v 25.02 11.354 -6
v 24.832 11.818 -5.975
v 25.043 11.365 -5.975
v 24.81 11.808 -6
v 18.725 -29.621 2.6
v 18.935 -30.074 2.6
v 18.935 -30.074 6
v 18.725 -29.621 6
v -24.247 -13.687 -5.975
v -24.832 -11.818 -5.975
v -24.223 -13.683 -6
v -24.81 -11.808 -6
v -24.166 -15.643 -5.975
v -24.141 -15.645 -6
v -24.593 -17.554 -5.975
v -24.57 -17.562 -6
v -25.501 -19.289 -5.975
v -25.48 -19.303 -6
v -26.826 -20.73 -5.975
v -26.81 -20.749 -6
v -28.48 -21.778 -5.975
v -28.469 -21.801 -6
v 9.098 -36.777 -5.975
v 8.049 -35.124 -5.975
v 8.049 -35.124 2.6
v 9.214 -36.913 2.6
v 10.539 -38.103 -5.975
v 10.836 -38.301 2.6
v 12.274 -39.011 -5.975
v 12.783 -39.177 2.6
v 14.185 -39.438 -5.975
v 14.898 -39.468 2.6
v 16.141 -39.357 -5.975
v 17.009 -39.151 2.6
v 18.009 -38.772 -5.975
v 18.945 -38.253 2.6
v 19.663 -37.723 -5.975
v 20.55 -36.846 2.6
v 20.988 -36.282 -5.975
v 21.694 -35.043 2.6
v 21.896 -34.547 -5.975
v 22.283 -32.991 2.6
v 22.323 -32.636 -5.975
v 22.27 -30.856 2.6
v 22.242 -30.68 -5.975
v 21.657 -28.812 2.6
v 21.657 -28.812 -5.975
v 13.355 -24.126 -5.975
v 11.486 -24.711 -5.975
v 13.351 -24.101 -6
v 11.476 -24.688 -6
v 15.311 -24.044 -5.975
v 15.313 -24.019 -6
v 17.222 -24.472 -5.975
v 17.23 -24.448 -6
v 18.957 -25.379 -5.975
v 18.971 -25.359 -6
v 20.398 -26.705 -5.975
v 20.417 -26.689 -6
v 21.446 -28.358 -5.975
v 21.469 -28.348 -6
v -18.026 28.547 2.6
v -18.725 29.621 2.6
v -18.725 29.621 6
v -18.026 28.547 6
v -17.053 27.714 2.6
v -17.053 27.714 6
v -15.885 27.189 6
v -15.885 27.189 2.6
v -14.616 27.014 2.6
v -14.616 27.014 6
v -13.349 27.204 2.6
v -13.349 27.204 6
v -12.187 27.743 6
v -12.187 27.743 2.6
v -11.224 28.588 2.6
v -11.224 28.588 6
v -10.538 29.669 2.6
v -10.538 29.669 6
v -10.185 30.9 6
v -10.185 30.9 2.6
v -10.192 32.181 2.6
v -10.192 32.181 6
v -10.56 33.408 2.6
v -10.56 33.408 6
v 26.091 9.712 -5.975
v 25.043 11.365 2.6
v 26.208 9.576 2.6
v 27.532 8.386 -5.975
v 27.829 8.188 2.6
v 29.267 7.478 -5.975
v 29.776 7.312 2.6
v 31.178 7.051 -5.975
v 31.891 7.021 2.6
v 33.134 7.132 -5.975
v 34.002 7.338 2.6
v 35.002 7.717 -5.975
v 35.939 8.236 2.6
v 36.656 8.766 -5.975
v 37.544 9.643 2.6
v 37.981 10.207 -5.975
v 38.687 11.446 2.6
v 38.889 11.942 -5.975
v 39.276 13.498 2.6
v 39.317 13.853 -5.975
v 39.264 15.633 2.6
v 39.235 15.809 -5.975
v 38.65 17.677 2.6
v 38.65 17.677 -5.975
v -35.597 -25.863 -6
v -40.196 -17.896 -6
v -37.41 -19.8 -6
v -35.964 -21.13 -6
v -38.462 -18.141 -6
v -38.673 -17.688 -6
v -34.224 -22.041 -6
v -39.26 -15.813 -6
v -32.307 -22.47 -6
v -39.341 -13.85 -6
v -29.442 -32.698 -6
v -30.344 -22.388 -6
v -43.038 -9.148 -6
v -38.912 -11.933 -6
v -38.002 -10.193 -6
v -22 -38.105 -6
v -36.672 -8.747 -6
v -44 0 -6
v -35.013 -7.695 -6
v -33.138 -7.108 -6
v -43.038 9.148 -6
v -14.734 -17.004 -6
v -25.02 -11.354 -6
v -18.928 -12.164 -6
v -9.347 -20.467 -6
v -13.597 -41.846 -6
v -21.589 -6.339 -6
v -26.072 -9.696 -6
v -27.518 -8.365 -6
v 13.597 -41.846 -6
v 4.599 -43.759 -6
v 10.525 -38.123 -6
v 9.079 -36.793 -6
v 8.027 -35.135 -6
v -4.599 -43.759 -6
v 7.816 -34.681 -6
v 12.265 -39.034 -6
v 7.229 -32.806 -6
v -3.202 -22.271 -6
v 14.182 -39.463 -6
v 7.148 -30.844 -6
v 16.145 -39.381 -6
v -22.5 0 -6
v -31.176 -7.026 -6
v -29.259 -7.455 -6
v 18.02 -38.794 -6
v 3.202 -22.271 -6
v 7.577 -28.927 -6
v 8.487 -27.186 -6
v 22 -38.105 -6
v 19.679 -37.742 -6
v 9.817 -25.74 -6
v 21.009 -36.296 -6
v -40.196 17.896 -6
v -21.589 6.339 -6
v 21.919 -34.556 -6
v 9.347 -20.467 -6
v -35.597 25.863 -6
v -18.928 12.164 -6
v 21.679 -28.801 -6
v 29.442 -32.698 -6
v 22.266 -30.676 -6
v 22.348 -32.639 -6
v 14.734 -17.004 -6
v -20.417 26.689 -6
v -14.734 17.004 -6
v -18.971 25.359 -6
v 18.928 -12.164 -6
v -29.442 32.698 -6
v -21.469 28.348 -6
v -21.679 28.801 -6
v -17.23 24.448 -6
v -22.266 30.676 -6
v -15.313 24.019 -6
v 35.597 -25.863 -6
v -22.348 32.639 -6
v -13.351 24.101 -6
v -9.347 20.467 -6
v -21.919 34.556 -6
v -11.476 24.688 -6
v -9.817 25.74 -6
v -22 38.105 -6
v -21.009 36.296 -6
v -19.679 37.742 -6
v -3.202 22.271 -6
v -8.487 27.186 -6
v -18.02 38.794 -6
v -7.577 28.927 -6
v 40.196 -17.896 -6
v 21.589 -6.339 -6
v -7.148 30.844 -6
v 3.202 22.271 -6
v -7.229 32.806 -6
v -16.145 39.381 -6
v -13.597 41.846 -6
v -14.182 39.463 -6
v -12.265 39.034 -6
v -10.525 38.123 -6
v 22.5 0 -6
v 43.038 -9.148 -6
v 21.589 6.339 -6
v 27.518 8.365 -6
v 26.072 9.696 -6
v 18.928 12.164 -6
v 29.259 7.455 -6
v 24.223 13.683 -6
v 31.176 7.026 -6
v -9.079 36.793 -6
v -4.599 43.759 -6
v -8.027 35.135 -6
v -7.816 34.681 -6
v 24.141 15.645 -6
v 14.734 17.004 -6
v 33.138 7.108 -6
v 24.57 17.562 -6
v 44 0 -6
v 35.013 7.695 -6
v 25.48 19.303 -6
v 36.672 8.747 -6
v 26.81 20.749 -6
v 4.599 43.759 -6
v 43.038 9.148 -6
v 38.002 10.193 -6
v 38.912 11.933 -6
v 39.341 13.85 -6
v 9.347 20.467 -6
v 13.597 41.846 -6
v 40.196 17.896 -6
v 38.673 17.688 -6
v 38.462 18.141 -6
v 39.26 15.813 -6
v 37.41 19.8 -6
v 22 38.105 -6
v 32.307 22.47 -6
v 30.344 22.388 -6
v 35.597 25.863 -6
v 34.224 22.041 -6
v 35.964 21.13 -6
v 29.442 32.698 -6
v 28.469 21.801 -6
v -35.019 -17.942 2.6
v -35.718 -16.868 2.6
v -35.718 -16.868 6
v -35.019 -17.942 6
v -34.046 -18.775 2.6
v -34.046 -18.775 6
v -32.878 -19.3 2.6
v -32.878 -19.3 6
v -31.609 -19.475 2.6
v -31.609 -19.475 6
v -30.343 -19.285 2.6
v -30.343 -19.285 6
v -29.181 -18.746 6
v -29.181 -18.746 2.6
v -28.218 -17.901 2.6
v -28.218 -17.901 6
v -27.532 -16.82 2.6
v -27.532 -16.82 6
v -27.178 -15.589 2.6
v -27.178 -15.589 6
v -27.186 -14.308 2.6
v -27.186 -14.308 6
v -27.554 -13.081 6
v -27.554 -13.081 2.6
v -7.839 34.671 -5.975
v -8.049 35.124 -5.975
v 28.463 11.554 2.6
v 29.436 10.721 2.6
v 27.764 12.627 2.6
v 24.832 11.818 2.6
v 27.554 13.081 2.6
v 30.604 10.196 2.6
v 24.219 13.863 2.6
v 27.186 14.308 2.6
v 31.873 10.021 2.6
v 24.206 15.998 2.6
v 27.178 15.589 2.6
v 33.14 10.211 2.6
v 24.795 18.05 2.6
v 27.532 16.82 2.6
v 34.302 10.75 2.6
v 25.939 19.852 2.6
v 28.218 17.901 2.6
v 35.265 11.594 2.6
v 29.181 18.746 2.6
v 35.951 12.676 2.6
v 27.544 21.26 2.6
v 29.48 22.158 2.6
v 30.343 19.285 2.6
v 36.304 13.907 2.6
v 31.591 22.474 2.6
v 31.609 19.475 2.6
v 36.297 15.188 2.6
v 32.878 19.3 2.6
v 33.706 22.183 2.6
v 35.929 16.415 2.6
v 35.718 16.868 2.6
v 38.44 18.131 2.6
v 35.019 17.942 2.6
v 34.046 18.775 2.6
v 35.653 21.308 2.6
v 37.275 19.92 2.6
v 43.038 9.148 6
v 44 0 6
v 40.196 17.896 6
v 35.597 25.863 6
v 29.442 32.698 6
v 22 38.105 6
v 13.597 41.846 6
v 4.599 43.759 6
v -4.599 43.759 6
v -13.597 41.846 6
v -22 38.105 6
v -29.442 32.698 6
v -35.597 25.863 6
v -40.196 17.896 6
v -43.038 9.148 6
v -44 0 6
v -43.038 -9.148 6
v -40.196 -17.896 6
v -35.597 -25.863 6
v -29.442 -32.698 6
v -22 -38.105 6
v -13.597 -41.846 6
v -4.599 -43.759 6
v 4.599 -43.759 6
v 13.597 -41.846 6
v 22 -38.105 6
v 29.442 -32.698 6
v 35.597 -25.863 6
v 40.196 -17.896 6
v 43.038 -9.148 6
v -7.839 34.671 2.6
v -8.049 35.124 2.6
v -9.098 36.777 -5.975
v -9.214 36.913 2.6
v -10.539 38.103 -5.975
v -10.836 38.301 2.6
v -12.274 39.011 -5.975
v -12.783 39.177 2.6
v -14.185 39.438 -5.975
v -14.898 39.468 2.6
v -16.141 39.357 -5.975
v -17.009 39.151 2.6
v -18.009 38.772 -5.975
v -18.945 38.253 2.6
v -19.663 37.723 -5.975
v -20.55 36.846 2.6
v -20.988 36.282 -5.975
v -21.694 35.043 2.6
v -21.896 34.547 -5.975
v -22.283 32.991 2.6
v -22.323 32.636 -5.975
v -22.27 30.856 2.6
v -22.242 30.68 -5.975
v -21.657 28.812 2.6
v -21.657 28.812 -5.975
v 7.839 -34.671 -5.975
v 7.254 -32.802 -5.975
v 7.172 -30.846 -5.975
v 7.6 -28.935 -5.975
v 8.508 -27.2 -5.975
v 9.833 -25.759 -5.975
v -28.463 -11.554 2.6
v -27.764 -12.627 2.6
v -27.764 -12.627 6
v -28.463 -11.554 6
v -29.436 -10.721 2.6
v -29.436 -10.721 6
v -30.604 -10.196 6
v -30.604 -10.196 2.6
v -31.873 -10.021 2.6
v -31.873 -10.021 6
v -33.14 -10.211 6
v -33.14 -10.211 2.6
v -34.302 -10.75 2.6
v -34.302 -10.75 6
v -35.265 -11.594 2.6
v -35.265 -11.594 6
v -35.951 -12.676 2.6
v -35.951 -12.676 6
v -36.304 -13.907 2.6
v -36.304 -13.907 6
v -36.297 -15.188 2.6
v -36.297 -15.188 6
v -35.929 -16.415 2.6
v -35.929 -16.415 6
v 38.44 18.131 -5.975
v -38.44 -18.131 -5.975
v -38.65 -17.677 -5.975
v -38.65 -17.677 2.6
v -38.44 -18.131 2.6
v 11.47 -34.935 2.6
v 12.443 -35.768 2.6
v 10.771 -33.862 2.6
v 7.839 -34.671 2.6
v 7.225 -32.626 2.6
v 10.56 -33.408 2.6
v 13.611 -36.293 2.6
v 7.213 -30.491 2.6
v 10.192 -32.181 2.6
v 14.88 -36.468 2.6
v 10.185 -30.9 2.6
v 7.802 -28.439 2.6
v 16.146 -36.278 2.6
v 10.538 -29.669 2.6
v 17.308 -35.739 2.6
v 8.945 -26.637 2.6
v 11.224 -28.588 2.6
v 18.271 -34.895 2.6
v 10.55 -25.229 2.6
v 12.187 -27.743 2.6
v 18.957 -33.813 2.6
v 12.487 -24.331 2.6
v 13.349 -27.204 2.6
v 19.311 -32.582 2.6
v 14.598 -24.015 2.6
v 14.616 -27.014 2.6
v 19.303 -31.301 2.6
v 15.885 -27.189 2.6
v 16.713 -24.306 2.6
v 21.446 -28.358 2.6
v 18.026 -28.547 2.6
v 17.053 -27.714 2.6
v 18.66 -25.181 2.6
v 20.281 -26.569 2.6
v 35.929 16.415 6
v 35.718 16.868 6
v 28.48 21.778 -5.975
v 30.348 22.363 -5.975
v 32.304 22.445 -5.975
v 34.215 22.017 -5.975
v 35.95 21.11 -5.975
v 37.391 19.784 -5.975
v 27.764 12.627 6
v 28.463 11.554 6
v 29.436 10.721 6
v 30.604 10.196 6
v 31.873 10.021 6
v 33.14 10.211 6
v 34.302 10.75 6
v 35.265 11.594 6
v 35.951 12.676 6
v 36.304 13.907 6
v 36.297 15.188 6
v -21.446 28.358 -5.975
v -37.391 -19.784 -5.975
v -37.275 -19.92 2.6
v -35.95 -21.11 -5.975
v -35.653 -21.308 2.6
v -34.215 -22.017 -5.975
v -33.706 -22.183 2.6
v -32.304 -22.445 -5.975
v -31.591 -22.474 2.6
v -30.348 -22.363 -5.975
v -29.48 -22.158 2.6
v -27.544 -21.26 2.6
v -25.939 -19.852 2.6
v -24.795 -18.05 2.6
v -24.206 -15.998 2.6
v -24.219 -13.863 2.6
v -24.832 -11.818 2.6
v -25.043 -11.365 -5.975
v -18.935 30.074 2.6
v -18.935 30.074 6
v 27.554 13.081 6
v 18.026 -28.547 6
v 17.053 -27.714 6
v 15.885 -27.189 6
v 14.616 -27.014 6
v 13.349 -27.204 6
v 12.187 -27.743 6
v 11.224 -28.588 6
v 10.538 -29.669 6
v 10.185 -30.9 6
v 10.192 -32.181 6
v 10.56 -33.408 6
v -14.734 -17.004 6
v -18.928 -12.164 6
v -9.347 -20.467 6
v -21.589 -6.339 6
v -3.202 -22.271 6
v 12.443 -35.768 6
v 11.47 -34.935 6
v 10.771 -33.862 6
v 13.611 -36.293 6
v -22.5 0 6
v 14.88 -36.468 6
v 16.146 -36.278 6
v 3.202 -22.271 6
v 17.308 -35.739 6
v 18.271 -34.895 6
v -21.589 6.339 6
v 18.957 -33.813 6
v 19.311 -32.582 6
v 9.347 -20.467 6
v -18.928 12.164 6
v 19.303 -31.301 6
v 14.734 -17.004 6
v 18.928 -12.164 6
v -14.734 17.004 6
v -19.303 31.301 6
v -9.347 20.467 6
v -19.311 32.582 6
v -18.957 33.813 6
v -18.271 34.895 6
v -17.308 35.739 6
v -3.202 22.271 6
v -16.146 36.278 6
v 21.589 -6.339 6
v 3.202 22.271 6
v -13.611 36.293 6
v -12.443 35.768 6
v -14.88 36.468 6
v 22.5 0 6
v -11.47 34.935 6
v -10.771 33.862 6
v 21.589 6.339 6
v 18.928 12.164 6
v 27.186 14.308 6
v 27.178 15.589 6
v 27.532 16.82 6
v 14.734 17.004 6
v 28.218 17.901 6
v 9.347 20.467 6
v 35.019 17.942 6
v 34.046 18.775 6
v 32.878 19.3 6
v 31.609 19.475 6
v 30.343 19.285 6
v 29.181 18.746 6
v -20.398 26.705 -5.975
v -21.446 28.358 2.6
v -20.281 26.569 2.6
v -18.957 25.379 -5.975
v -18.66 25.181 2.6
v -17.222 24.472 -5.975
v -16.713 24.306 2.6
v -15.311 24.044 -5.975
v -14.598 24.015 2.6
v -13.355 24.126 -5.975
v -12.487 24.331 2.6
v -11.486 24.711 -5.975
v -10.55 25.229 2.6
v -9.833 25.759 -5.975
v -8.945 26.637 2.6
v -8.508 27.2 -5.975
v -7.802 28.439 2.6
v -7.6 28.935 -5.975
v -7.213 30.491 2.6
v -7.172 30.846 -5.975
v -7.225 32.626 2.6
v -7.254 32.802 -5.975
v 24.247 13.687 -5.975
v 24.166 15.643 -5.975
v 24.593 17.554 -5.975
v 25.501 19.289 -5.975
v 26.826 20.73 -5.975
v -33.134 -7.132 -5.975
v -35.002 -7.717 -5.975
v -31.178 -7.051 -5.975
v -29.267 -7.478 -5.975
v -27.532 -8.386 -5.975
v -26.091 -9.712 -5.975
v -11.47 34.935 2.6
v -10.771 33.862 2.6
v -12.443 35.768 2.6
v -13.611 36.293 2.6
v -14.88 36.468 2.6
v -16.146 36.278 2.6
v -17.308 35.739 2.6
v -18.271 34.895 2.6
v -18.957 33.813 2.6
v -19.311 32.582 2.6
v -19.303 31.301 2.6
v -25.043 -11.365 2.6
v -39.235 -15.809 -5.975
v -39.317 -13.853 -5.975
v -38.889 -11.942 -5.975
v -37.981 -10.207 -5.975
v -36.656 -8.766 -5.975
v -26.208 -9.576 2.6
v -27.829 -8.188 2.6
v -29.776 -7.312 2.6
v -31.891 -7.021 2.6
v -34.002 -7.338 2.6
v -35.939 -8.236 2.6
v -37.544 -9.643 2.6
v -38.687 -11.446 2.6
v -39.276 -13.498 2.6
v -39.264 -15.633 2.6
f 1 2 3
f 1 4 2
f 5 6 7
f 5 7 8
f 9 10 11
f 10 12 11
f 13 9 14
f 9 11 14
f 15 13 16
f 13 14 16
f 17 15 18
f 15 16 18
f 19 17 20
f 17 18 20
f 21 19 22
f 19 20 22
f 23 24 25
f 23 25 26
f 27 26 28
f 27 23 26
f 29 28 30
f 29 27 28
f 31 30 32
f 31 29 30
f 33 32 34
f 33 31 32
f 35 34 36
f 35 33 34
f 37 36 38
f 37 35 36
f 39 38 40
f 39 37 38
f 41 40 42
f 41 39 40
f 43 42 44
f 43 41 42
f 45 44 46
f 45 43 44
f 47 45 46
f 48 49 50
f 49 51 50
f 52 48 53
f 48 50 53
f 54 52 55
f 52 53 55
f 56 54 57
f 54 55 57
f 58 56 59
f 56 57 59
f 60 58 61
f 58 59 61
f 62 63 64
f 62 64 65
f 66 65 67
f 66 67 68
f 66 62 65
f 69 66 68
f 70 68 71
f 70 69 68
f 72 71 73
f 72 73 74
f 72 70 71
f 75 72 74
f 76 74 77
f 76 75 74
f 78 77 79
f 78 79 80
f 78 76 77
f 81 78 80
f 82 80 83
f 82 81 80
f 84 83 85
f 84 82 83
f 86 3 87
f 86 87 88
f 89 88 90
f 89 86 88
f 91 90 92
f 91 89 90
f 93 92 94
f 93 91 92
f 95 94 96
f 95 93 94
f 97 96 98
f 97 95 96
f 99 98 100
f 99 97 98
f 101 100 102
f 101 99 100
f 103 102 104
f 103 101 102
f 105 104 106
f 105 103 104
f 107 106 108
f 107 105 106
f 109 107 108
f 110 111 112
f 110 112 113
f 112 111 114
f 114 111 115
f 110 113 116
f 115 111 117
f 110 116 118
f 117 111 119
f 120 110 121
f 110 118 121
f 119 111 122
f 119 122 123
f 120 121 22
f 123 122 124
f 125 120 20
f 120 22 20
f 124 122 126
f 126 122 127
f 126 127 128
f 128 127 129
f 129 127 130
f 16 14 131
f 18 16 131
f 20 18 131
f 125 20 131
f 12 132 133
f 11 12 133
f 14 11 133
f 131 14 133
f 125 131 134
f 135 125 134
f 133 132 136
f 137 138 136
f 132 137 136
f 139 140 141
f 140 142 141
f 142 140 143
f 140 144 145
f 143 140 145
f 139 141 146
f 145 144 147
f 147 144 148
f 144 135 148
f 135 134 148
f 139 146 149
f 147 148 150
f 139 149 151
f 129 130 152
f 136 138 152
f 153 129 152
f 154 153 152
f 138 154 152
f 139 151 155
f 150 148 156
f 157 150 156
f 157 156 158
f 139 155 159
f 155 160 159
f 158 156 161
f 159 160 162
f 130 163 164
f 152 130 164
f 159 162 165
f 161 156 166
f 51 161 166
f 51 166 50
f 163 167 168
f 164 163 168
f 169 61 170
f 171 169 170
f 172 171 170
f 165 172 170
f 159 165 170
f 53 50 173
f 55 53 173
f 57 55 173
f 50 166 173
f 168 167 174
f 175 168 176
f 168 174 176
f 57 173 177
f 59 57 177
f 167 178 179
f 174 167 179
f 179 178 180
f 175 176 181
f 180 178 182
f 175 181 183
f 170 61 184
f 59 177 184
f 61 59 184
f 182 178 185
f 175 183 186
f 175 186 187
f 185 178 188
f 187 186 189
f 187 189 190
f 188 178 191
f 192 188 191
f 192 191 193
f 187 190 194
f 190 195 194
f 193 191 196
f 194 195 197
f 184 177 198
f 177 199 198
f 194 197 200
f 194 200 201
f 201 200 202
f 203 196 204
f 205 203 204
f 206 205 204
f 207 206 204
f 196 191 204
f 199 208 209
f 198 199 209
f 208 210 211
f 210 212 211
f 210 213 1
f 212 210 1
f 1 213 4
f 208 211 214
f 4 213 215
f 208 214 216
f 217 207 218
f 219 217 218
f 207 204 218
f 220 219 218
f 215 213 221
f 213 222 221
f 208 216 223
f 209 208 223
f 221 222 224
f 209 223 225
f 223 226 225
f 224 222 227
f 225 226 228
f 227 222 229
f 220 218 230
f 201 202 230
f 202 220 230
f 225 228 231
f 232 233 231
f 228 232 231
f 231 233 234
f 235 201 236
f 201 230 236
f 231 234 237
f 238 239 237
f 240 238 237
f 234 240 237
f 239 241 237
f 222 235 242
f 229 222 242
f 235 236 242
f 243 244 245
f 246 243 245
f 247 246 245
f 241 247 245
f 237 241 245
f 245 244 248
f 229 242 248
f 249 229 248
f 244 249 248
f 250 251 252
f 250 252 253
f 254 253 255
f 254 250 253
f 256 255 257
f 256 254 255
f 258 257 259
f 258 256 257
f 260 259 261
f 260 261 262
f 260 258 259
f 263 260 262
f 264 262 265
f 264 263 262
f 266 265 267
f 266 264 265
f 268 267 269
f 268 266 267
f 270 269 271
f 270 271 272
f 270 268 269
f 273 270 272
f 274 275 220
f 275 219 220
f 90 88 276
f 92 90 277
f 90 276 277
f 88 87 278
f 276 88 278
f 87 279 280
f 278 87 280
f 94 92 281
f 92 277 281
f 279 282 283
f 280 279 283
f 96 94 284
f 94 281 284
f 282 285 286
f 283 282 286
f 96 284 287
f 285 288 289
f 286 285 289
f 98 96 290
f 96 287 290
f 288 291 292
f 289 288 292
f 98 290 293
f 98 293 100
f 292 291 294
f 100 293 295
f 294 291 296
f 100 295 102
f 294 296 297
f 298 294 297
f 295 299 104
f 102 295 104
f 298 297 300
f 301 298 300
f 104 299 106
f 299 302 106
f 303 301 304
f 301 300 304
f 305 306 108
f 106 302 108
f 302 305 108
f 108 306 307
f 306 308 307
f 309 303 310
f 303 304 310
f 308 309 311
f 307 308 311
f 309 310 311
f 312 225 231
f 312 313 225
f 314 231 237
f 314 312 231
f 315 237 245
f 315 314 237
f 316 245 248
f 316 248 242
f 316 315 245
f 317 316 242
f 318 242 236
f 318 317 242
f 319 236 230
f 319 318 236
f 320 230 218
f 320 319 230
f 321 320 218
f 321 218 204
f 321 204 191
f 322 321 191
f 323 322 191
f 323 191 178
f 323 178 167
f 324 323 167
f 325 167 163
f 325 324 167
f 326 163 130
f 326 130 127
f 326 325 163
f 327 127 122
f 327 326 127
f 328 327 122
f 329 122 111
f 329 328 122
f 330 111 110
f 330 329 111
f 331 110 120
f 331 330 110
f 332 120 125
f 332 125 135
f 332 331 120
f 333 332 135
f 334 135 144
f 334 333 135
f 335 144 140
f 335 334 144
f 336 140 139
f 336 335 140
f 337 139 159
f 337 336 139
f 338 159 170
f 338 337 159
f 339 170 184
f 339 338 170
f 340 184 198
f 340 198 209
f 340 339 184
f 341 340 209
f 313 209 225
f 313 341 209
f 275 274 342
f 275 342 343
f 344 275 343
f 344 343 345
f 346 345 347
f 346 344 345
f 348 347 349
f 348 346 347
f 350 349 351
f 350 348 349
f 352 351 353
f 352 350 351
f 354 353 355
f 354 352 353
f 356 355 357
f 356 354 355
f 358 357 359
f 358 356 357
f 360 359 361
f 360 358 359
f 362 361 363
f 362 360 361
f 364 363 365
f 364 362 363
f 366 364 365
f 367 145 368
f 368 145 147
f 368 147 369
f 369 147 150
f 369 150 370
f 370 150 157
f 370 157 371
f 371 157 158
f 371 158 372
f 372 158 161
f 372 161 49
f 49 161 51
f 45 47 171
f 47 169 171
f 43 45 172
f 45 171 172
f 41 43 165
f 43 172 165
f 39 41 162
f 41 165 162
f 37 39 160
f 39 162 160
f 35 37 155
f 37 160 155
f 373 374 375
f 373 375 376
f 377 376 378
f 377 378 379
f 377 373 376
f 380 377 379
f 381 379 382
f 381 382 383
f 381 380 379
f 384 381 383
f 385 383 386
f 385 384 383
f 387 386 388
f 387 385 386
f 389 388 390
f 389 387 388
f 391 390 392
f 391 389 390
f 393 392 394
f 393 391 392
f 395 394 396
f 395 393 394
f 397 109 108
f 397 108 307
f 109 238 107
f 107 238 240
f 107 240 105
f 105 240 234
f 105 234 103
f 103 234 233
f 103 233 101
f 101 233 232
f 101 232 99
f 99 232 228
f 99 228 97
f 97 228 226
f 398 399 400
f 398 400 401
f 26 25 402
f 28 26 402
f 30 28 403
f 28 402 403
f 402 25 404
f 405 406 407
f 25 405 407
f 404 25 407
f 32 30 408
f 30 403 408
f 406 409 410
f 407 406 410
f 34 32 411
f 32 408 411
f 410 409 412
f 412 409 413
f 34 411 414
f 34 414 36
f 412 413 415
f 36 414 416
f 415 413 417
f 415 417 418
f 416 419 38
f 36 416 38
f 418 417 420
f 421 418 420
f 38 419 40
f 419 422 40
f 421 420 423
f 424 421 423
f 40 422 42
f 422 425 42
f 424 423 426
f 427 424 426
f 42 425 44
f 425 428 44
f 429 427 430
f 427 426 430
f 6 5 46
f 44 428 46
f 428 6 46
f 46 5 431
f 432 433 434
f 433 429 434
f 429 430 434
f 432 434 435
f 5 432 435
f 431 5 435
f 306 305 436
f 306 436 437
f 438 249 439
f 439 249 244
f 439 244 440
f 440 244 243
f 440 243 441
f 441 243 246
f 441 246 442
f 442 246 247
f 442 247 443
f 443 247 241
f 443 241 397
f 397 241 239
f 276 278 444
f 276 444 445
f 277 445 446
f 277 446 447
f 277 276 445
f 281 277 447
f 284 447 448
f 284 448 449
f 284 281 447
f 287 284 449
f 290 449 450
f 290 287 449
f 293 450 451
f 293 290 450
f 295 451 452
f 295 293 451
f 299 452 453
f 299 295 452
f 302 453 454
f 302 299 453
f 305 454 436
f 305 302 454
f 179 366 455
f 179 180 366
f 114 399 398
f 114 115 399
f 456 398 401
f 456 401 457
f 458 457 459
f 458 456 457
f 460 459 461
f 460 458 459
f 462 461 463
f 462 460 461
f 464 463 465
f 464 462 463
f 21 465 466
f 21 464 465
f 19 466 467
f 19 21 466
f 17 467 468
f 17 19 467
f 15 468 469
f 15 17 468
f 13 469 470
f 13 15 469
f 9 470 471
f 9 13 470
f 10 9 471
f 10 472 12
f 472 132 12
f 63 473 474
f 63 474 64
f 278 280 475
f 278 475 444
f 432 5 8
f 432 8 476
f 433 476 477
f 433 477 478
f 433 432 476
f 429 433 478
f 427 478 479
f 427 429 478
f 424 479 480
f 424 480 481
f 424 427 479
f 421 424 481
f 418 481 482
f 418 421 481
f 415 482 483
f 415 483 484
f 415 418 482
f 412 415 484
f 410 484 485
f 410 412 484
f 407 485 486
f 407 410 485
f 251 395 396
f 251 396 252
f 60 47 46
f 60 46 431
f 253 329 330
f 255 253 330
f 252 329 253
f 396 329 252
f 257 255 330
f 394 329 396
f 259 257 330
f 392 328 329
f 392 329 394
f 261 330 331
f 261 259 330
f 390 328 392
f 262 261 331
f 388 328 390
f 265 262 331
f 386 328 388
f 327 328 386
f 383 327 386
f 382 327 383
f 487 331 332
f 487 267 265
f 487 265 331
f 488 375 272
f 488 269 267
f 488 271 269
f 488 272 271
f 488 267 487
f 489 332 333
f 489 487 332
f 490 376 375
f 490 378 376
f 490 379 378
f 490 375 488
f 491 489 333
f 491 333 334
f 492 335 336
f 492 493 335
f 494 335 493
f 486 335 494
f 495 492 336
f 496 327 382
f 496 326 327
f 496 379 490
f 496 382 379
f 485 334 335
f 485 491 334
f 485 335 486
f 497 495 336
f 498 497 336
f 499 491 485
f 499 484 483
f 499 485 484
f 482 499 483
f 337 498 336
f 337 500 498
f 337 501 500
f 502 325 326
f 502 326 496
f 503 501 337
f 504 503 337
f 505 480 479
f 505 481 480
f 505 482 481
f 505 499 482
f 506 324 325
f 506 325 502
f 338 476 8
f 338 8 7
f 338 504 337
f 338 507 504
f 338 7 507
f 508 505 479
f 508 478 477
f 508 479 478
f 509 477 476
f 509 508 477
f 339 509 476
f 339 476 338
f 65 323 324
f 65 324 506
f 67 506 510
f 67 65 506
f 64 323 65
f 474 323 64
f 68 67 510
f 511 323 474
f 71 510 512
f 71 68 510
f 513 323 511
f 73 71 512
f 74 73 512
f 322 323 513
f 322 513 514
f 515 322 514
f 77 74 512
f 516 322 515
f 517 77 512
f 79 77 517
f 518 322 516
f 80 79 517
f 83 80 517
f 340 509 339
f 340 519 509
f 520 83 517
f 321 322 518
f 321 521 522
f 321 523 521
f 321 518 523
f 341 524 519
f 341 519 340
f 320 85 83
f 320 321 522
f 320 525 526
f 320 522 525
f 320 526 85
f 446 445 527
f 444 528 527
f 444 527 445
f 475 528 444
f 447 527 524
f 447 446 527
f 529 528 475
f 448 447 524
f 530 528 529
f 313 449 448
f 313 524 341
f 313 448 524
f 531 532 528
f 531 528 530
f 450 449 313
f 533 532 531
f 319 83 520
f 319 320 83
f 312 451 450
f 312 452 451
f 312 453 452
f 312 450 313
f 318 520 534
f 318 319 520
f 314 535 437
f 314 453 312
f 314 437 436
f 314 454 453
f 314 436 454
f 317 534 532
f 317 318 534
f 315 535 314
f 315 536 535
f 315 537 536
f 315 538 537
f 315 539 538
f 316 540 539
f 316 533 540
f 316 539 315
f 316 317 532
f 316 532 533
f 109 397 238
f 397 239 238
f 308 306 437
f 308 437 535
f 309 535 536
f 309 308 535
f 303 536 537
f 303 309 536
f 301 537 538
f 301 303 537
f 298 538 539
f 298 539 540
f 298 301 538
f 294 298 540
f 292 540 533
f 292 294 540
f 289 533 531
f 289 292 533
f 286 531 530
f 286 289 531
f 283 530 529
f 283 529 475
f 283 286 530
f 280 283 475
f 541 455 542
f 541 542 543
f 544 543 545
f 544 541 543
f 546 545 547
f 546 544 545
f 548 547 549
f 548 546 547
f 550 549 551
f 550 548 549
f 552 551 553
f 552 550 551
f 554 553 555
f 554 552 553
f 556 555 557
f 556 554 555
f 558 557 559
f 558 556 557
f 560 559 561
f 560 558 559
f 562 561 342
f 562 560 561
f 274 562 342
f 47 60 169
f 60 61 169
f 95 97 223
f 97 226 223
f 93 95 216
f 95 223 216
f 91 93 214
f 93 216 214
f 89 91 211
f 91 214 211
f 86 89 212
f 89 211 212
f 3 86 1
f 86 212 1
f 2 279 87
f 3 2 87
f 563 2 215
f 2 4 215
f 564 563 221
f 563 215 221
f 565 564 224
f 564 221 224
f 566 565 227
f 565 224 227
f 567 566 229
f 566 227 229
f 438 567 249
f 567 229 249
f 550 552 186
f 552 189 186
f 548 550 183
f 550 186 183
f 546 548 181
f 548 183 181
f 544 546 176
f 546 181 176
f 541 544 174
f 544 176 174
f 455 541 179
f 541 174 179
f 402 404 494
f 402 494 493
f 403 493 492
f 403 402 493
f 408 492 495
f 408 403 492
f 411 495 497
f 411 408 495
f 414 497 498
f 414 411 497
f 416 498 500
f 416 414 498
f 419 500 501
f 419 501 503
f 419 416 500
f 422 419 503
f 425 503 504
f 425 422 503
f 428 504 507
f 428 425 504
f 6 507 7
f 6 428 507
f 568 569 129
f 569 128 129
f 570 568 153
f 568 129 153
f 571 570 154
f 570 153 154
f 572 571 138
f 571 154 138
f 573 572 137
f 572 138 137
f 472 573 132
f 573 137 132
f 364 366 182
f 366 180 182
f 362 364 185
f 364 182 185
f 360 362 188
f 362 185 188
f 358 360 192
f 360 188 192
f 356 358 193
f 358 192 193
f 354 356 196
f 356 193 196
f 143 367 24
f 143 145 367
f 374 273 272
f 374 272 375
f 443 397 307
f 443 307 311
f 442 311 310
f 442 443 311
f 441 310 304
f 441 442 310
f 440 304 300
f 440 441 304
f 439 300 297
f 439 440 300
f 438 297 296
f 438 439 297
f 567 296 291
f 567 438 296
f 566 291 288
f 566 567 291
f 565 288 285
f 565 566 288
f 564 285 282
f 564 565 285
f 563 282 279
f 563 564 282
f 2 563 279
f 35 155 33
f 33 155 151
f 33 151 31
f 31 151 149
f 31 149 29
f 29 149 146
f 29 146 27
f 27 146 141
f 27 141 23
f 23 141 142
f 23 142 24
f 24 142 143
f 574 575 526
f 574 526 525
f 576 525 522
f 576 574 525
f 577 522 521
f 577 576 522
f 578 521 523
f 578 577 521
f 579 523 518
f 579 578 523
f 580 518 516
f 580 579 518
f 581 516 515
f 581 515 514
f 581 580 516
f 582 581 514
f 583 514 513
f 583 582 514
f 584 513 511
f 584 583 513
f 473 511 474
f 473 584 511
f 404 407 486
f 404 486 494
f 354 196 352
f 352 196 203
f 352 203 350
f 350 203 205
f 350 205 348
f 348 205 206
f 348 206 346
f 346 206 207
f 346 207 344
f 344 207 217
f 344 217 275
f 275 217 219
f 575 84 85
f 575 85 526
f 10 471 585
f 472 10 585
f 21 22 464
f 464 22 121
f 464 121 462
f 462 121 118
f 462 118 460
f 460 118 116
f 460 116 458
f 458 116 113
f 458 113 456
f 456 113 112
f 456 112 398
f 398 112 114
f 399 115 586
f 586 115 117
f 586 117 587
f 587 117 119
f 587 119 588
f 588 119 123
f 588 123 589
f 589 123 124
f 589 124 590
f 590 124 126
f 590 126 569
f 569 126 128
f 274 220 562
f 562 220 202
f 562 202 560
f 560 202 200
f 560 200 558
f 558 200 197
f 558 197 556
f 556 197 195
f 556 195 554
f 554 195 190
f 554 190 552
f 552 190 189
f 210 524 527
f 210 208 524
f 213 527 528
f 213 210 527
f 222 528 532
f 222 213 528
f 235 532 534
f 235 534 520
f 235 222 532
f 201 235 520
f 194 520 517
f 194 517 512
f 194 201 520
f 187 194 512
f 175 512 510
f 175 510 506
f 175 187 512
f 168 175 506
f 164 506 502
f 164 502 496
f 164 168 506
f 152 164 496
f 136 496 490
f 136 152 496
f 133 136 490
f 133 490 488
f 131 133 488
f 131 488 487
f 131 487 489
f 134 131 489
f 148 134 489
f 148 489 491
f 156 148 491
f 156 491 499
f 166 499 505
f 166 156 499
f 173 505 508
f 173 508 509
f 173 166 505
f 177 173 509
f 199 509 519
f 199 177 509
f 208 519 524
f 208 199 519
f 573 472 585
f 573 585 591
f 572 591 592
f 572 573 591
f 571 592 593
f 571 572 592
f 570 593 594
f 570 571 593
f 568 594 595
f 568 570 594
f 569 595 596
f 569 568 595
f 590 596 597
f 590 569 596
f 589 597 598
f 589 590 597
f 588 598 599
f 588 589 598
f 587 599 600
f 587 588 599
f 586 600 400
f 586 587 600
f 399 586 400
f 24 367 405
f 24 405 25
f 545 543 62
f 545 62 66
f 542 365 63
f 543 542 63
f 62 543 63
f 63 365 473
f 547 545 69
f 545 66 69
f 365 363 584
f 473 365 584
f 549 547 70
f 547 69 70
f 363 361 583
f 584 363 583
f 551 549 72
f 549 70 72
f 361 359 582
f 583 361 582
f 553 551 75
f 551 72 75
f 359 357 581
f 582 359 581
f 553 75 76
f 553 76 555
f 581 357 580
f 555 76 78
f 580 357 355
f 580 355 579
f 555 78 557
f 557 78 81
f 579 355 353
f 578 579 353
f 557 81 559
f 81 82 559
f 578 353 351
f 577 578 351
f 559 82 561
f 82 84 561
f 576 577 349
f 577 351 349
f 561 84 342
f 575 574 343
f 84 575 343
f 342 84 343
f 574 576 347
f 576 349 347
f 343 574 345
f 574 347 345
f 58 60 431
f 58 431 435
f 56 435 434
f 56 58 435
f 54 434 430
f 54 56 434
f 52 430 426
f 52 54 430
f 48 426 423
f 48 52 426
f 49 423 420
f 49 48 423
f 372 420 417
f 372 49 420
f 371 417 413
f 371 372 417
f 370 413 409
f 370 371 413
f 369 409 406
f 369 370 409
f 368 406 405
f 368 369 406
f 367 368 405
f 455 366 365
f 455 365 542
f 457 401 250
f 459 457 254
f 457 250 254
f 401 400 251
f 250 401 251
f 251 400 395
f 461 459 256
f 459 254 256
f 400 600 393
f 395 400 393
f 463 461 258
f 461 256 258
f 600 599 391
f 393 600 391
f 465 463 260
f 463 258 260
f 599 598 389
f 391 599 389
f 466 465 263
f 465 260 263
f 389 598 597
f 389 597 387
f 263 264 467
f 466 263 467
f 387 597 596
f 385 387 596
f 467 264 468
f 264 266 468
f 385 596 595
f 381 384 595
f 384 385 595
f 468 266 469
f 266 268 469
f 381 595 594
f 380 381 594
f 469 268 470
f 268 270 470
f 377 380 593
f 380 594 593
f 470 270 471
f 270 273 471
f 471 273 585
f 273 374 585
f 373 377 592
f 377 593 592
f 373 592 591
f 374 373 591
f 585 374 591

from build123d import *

# Parameters (mm, degrees)
SKETCH1_R                                      = 44
SKETCH1_R_2                                    = 22.5
BOSS_EXTRUDE1_DEPTH                            = 6
CBORE_START                                    = -6
CBORE_SLOT_FOR_M8_HEX_SOCKET_HEAD_CAP_SC_DEPTH = 8.6
CBORE_START_2                                  = 2.6
CBORE_SLOT_FOR_M8_HEX_SOCKET_HEAD_CA_3_DEPTH   = 3.4


with BuildPart() as part:
    # Sketch1 → Boss-Extrude1 (new, symmetric)
    with BuildSketch(Plane.XY):
        Circle(SKETCH1_R)
        Circle(SKETCH1_R_2, mode=Mode.SUBTRACT)
    extrude(amount=BOSS_EXTRUDE1_DEPTH, both=True)

    # CBORE SLOT for M8 Hex Socket Head Cap Screw1: read off the stored shape, not the designer's step
    # CBORE SLOT for M8 Hex Socket Head Ca 2 → CBORE SLOT for M8 Hex Socket Head Cap Screw1 (cut)
    with BuildSketch(Plane.XY.offset(CBORE_START)):
        with BuildLine():
            ThreePointArc((38.439558263, 18.130729877), (28.479840149, 21.778196819), (24.832373207, 11.818478705))
            Line((24.832373207, 11.818478705), (25.04278158, 11.36490587))
            ThreePointArc((25.04278158, 11.36490587), (35.002499693, 7.717438928), (38.649966636, 17.677157041))
            Line((38.649966636, 17.677157041), (38.439558263, 18.130729877))
        make_face()
        with BuildLine():
            ThreePointArc((21.446206215, -28.358257918), (11.486488101, -24.710790976), (7.839021159, -34.67050909))
            Line((7.839021159, -34.67050909), (8.049429531, -35.124081925))
            ThreePointArc((8.049429531, -35.124081925), (18.009147645, -38.771548867), (21.656614587, -28.811830753))
            Line((21.656614587, -28.811830753), (21.446206215, -28.358257918))
        make_face()
        with BuildLine():
            ThreePointArc((-25.04278158, -11.36490587), (-35.002499693, -7.717438928), (-38.649966636, -17.677157041))
            Line((-38.649966636, -17.677157041), (-38.439558263, -18.130729877))
            ThreePointArc((-38.439558263, -18.130729877), (-28.479840149, -21.778196819), (-24.832373207, -11.818478705))
            Line((-24.832373207, -11.818478705), (-25.04278158, -11.36490587))
        make_face()
        with BuildLine():
            ThreePointArc((-8.049429531, 35.124081925), (-18.009147645, 38.771548867), (-21.656614587, 28.811830753))
            Line((-21.656614587, 28.811830753), (-21.446206215, 28.358257918))
            ThreePointArc((-21.446206215, 28.358257918), (-11.486488101, 24.710790976), (-7.839021159, 34.67050909))
            Line((-7.839021159, 34.67050909), (-8.049429531, 35.124081925))
        make_face()
    extrude(amount=CBORE_SLOT_FOR_M8_HEX_SOCKET_HEAD_CAP_SC_DEPTH, mode=Mode.SUBTRACT)

    # CBORE SLOT for M8 Hex Socket Head Ca 3 o → CBORE SLOT for M8 Hex Socket Head Ca 3 (cut)
    with BuildSketch(Plane.XY.offset(CBORE_START_2)):
        with BuildLine():
            ThreePointArc((35.718121252, 16.868279642), (29.742290383, 19.056759808), (27.553810218, 13.080928939))
            Line((27.553810218, 13.080928939), (27.764218591, 12.627356104))
            ThreePointArc((27.764218591, 12.627356104), (33.740049459, 10.438875939), (35.928529624, 16.414706807))
            Line((35.928529624, 16.414706807), (35.718121252, 16.868279642))
        make_face()
        with BuildLine():
            ThreePointArc((18.724769204, -29.620708152), (12.748938336, -27.432227987), (10.56045817, -33.408058855))
            Line((10.56045817, -33.408058855), (10.770866543, -33.86163169))
            ThreePointArc((10.770866543, -33.86163169), (16.746697411, -36.050111856), (18.935177576, -30.074280987))
            Line((18.935177576, -30.074280987), (18.724769204, -29.620708152))
        make_face()
        with BuildLine():
            ThreePointArc((-27.764218591, -12.627356104), (-33.740049459, -10.438875939), (-35.928529624, -16.414706807))
            Line((-35.928529624, -16.414706807), (-35.718121252, -16.868279642))
            ThreePointArc((-35.718121252, -16.868279642), (-29.742290383, -19.056759808), (-27.553810218, -13.080928939))
            Line((-27.553810218, -13.080928939), (-27.764218591, -12.627356104))
        make_face()
        with BuildLine():
            ThreePointArc((-10.770866543, 33.86163169), (-16.746697411, 36.050111856), (-18.935177576, 30.074280987))
            Line((-18.935177576, 30.074280987), (-18.724769204, 29.620708152))
            ThreePointArc((-18.724769204, 29.620708152), (-12.748938336, 27.432227987), (-10.56045817, 33.408058855))
            Line((-10.56045817, 33.408058855), (-10.770866543, 33.86163169))
        make_face()
    extrude(amount=CBORE_SLOT_FOR_M8_HEX_SOCKET_HEAD_CA_3_DEPTH, mode=Mode.SUBTRACT)

    # CBORE SLOT for M8 Hex Socket Head Ca 4: loft between two sections, ruled curve by curve
    cbore_slot_for_m8_hex_socket_head_ca_4_from = [
        Edge.make_three_point_arc((24.832373207, 11.818478705, -5.975), (24.593381518, 17.5537529, -5.975), (28.479840149, 21.778196819, -5.975)),
        Edge.make_three_point_arc((28.479840149, 21.778196819, -5.975), (34.215114344, 22.017188508, -5.975), (38.439558263, 18.130729877, -5.975)),
        Edge.make_three_point_arc((38.649966636, 17.677157041, -5.975), (38.888958324, 11.941882847, -5.975), (35.002499693, 7.717438928, -5.975)),
        Edge.make_three_point_arc((35.002499693, 7.717438928, -5.975), (29.267225499, 7.478447239, -5.975), (25.04278158, 11.36490587, -5.975)),
        Edge.make_line((38.439558263, 18.130729877, -5.975), (38.649966636, 17.677157041, -5.975)),
        Edge.make_line((24.832373207, 11.818478705, -5.975), (25.04278158, 11.36490587, -5.975)),
    ]
    cbore_slot_for_m8_hex_socket_head_ca_4_to = [
        Edge.make_three_point_arc((24.809694565, 11.807958286, -6), (24.569906238, 17.562350062, -6), (28.469319731, 21.800875461, -6)),
        Edge.make_three_point_arc((28.469319731, 21.800875461, -6), (34.223711506, 22.040663789, -6), (38.462236905, 18.141250295, -6)),
        Edge.make_three_point_arc((38.672645277, 17.68767746, -6), (38.912433605, 11.933285685, -6), (35.013020112, 7.694760286, -6)),
        Edge.make_three_point_arc((35.013020112, 7.694760286, -6), (29.258628337, 7.454971958, -6), (25.020102938, 11.354385451, -6)),
        Edge.make_line((38.462236905, 18.141250295, -6), (38.672645277, 17.68767746, -6)),
        Edge.make_line((24.809694565, 11.807958286, -6), (25.020102938, 11.354385451, -6)),
    ]
    cbore_slot_for_m8_hex_socket_head_ca_4 = Solid(Shell([*[Face.make_surface_from_curves(cbore_slot_for_m8_hex_socket_head_ca_4_from[k], cbore_slot_for_m8_hex_socket_head_ca_4_to[k]) for k in range(6)], Face(Wire(cbore_slot_for_m8_hex_socket_head_ca_4_from)), Face(Wire(cbore_slot_for_m8_hex_socket_head_ca_4_to))]))
    add(cbore_slot_for_m8_hex_socket_head_ca_4, mode=Mode.SUBTRACT)

    # CBORE SLOT for M8 Hex Socket Head Ca 5: loft between two sections, ruled curve by curve
    cbore_slot_for_m8_hex_socket_head_ca_5_from = [
        Edge.make_three_point_arc((7.839021159, -34.67050909, -5.975), (7.60002947, -28.935234895, -5.975), (11.486488101, -24.710790976, -5.975)),
        Edge.make_three_point_arc((11.486488101, -24.710790976, -5.975), (17.221762296, -24.471799287, -5.975), (21.446206215, -28.358257918, -5.975)),
        Edge.make_three_point_arc((21.656614587, -28.811830753, -5.975), (21.895606276, -34.547104948, -5.975), (18.009147645, -38.771548867, -5.975)),
        Edge.make_three_point_arc((18.009147645, -38.771548867, -5.975), (12.27387345, -39.010540556, -5.975), (8.049429531, -35.124081925, -5.975)),
        Edge.make_line((21.446206215, -28.358257918, -5.975), (21.656614587, -28.811830753, -5.975)),
        Edge.make_line((7.839021159, -34.67050909, -5.975), (8.049429531, -35.124081925, -5.975)),
    ]
    cbore_slot_for_m8_hex_socket_head_ca_5_to = [
        Edge.make_three_point_arc((7.816342517, -34.681029508, -6), (7.576554189, -28.926637733, -6), (11.475967683, -24.688112334, -6)),
        Edge.make_three_point_arc((11.475967683, -24.688112334, -6), (17.230359458, -24.448324006, -6), (21.468884857, -28.347737499, -6)),
        Edge.make_three_point_arc((21.679293229, -28.801310335, -6), (21.919081557, -34.55570211, -6), (18.019668064, -38.794227509, -6)),
        Edge.make_three_point_arc((18.019668064, -38.794227509, -6), (12.265276288, -39.034015837, -6), (8.02675089, -35.134602343, -6)),
        Edge.make_line((21.468884857, -28.347737499, -6), (21.679293229, -28.801310335, -6)),
        Edge.make_line((7.816342517, -34.681029508, -6), (8.02675089, -35.134602343, -6)),
    ]
    cbore_slot_for_m8_hex_socket_head_ca_5 = Solid(Shell([*[Face.make_surface_from_curves(cbore_slot_for_m8_hex_socket_head_ca_5_from[k], cbore_slot_for_m8_hex_socket_head_ca_5_to[k]) for k in range(6)], Face(Wire(cbore_slot_for_m8_hex_socket_head_ca_5_from)), Face(Wire(cbore_slot_for_m8_hex_socket_head_ca_5_to))]))
    add(cbore_slot_for_m8_hex_socket_head_ca_5, mode=Mode.SUBTRACT)

    # CBORE SLOT for M8 Hex Socket Head Ca 6: loft between two sections, ruled curve by curve
    cbore_slot_for_m8_hex_socket_head_ca_6_from = [
        Edge.make_three_point_arc((-38.649966636, -17.677157041, -5.975), (-38.888958324, -11.941882847, -5.975), (-35.002499693, -7.717438928, -5.975)),
        Edge.make_three_point_arc((-35.002499693, -7.717438928, -5.975), (-29.267225499, -7.478447239, -5.975), (-25.04278158, -11.36490587, -5.975)),
        Edge.make_three_point_arc((-24.832373207, -11.818478705, -5.975), (-24.593381518, -17.5537529, -5.975), (-28.479840149, -21.778196819, -5.975)),
        Edge.make_three_point_arc((-28.479840149, -21.778196819, -5.975), (-34.215114344, -22.017188508, -5.975), (-38.439558263, -18.130729877, -5.975)),
        Edge.make_line((-25.04278158, -11.36490587, -5.975), (-24.832373207, -11.818478705, -5.975)),
        Edge.make_line((-38.649966636, -17.677157041, -5.975), (-38.439558263, -18.130729877, -5.975)),
    ]
    cbore_slot_for_m8_hex_socket_head_ca_6_to = [
        Edge.make_three_point_arc((-38.672645277, -17.68767746, -6), (-38.912433605, -11.933285685, -6), (-35.013020112, -7.694760286, -6)),
        Edge.make_three_point_arc((-35.013020112, -7.694760286, -6), (-29.258628337, -7.454971958, -6), (-25.020102938, -11.354385451, -6)),
        Edge.make_three_point_arc((-24.809694565, -11.807958286, -6), (-24.569906238, -17.562350062, -6), (-28.469319731, -21.800875461, -6)),
        Edge.make_three_point_arc((-28.469319731, -21.800875461, -6), (-34.223711506, -22.040663789, -6), (-38.462236905, -18.141250295, -6)),
        Edge.make_line((-25.020102938, -11.354385451, -6), (-24.809694565, -11.807958286, -6)),
        Edge.make_line((-38.672645277, -17.68767746, -6), (-38.462236905, -18.141250295, -6)),
    ]
    cbore_slot_for_m8_hex_socket_head_ca_6 = Solid(Shell([*[Face.make_surface_from_curves(cbore_slot_for_m8_hex_socket_head_ca_6_from[k], cbore_slot_for_m8_hex_socket_head_ca_6_to[k]) for k in range(6)], Face(Wire(cbore_slot_for_m8_hex_socket_head_ca_6_from)), Face(Wire(cbore_slot_for_m8_hex_socket_head_ca_6_to))]))
    add(cbore_slot_for_m8_hex_socket_head_ca_6, mode=Mode.SUBTRACT)

    # CBORE SLOT for M8 Hex Socket Head Ca 7: loft between two sections, ruled curve by curve
    cbore_slot_for_m8_hex_socket_head_ca_7_from = [
        Edge.make_three_point_arc((-21.656614587, 28.811830753, -5.975), (-21.895606276, 34.547104948, -5.975), (-18.009147645, 38.771548867, -5.975)),
        Edge.make_three_point_arc((-18.009147645, 38.771548867, -5.975), (-12.27387345, 39.010540556, -5.975), (-8.049429531, 35.124081925, -5.975)),
        Edge.make_three_point_arc((-7.839021159, 34.67050909, -5.975), (-7.60002947, 28.935234895, -5.975), (-11.486488101, 24.710790976, -5.975)),
        Edge.make_three_point_arc((-11.486488101, 24.710790976, -5.975), (-17.221762296, 24.471799287, -5.975), (-21.446206215, 28.358257918, -5.975)),
        Edge.make_line((-8.049429531, 35.124081925, -5.975), (-7.839021159, 34.67050909, -5.975)),
        Edge.make_line((-21.656614587, 28.811830753, -5.975), (-21.446206215, 28.358257918, -5.975)),
    ]
    cbore_slot_for_m8_hex_socket_head_ca_7_to = [
        Edge.make_three_point_arc((-21.679293229, 28.801310335, -6), (-21.919081557, 34.55570211, -6), (-18.019668064, 38.794227509, -6)),
        Edge.make_three_point_arc((-18.019668064, 38.794227509, -6), (-12.265276288, 39.034015837, -6), (-8.02675089, 35.134602343, -6)),
        Edge.make_three_point_arc((-7.816342517, 34.681029508, -6), (-7.576554189, 28.926637733, -6), (-11.475967683, 24.688112334, -6)),
        Edge.make_three_point_arc((-11.475967683, 24.688112334, -6), (-17.230359458, 24.448324006, -6), (-21.468884857, 28.347737499, -6)),
        Edge.make_line((-8.02675089, 35.134602343, -6), (-7.816342517, 34.681029508, -6)),
        Edge.make_line((-21.679293229, 28.801310335, -6), (-21.468884857, 28.347737499, -6)),
    ]
    cbore_slot_for_m8_hex_socket_head_ca_7 = Solid(Shell([*[Face.make_surface_from_curves(cbore_slot_for_m8_hex_socket_head_ca_7_from[k], cbore_slot_for_m8_hex_socket_head_ca_7_to[k]) for k in range(6)], Face(Wire(cbore_slot_for_m8_hex_socket_head_ca_7_from)), Face(Wire(cbore_slot_for_m8_hex_socket_head_ca_7_to))]))
    add(cbore_slot_for_m8_hex_socket_head_ca_7, mode=Mode.SUBTRACT)


solid = part.part
